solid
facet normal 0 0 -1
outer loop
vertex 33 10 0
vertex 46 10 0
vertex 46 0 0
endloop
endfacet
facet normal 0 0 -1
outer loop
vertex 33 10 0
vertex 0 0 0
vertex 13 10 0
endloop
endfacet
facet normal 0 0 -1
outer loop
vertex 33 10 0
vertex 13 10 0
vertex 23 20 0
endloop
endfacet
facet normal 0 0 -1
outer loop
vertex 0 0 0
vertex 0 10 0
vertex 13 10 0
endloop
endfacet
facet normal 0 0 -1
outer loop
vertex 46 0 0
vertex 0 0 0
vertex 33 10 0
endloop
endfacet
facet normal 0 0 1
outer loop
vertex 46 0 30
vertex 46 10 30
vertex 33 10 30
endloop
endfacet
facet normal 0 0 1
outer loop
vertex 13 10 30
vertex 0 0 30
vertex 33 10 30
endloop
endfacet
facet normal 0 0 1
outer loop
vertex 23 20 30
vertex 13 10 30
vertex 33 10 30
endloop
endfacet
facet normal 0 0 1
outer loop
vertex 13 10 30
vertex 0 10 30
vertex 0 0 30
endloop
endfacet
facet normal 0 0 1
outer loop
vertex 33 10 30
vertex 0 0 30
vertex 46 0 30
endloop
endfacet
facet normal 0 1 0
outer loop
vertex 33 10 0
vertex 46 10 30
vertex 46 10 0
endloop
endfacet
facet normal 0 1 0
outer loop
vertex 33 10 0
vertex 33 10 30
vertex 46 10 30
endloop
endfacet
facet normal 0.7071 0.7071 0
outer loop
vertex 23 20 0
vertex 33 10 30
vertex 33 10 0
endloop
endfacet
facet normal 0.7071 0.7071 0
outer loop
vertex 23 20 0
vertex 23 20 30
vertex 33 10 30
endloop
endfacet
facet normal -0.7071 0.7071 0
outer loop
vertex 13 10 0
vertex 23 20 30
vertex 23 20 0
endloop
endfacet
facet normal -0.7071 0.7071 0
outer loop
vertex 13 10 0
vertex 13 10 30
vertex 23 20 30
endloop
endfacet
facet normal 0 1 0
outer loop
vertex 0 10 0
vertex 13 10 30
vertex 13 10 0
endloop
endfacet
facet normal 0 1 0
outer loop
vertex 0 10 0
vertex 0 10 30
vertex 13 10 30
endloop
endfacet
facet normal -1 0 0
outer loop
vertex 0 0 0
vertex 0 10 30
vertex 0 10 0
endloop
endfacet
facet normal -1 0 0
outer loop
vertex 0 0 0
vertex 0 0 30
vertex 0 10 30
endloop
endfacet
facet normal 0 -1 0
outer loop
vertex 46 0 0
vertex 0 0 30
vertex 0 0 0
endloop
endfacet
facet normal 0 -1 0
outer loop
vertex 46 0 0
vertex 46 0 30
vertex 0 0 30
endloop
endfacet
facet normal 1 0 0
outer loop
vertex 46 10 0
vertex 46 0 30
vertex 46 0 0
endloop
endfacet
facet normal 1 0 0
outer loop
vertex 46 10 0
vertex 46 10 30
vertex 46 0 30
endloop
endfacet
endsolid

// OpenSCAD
$fn = 32;

// ----------------------------------------------------------------------
// V guide rail: vrib, 46 mm wide
// ----------------------------------------------------------------------

// --- parameters (mm) ---
rail_w = 46;              // rail width, X
base_t = 10;              // base plate thickness
v_depth = 10;             // V feature depth / height
v_half_w = 10;            // half width of the V at the base face
plate_t = 30;             // rail length, Z (the extrusion height)
fit_tol = 0.02;           // declared fit tolerance (prompt contract)
free_tol = 0.2;           // declared free tolerance (prompt contract)

profile = [[0, 0], [46, 0], [46, 10], [33, 10], [23, 20], [13, 10], [0, 10]];  // primary outline, 7 points, counter clockwise

// --- the one profile operation ---
linear_extrude(height = plate_t) polygon(points = profile);
